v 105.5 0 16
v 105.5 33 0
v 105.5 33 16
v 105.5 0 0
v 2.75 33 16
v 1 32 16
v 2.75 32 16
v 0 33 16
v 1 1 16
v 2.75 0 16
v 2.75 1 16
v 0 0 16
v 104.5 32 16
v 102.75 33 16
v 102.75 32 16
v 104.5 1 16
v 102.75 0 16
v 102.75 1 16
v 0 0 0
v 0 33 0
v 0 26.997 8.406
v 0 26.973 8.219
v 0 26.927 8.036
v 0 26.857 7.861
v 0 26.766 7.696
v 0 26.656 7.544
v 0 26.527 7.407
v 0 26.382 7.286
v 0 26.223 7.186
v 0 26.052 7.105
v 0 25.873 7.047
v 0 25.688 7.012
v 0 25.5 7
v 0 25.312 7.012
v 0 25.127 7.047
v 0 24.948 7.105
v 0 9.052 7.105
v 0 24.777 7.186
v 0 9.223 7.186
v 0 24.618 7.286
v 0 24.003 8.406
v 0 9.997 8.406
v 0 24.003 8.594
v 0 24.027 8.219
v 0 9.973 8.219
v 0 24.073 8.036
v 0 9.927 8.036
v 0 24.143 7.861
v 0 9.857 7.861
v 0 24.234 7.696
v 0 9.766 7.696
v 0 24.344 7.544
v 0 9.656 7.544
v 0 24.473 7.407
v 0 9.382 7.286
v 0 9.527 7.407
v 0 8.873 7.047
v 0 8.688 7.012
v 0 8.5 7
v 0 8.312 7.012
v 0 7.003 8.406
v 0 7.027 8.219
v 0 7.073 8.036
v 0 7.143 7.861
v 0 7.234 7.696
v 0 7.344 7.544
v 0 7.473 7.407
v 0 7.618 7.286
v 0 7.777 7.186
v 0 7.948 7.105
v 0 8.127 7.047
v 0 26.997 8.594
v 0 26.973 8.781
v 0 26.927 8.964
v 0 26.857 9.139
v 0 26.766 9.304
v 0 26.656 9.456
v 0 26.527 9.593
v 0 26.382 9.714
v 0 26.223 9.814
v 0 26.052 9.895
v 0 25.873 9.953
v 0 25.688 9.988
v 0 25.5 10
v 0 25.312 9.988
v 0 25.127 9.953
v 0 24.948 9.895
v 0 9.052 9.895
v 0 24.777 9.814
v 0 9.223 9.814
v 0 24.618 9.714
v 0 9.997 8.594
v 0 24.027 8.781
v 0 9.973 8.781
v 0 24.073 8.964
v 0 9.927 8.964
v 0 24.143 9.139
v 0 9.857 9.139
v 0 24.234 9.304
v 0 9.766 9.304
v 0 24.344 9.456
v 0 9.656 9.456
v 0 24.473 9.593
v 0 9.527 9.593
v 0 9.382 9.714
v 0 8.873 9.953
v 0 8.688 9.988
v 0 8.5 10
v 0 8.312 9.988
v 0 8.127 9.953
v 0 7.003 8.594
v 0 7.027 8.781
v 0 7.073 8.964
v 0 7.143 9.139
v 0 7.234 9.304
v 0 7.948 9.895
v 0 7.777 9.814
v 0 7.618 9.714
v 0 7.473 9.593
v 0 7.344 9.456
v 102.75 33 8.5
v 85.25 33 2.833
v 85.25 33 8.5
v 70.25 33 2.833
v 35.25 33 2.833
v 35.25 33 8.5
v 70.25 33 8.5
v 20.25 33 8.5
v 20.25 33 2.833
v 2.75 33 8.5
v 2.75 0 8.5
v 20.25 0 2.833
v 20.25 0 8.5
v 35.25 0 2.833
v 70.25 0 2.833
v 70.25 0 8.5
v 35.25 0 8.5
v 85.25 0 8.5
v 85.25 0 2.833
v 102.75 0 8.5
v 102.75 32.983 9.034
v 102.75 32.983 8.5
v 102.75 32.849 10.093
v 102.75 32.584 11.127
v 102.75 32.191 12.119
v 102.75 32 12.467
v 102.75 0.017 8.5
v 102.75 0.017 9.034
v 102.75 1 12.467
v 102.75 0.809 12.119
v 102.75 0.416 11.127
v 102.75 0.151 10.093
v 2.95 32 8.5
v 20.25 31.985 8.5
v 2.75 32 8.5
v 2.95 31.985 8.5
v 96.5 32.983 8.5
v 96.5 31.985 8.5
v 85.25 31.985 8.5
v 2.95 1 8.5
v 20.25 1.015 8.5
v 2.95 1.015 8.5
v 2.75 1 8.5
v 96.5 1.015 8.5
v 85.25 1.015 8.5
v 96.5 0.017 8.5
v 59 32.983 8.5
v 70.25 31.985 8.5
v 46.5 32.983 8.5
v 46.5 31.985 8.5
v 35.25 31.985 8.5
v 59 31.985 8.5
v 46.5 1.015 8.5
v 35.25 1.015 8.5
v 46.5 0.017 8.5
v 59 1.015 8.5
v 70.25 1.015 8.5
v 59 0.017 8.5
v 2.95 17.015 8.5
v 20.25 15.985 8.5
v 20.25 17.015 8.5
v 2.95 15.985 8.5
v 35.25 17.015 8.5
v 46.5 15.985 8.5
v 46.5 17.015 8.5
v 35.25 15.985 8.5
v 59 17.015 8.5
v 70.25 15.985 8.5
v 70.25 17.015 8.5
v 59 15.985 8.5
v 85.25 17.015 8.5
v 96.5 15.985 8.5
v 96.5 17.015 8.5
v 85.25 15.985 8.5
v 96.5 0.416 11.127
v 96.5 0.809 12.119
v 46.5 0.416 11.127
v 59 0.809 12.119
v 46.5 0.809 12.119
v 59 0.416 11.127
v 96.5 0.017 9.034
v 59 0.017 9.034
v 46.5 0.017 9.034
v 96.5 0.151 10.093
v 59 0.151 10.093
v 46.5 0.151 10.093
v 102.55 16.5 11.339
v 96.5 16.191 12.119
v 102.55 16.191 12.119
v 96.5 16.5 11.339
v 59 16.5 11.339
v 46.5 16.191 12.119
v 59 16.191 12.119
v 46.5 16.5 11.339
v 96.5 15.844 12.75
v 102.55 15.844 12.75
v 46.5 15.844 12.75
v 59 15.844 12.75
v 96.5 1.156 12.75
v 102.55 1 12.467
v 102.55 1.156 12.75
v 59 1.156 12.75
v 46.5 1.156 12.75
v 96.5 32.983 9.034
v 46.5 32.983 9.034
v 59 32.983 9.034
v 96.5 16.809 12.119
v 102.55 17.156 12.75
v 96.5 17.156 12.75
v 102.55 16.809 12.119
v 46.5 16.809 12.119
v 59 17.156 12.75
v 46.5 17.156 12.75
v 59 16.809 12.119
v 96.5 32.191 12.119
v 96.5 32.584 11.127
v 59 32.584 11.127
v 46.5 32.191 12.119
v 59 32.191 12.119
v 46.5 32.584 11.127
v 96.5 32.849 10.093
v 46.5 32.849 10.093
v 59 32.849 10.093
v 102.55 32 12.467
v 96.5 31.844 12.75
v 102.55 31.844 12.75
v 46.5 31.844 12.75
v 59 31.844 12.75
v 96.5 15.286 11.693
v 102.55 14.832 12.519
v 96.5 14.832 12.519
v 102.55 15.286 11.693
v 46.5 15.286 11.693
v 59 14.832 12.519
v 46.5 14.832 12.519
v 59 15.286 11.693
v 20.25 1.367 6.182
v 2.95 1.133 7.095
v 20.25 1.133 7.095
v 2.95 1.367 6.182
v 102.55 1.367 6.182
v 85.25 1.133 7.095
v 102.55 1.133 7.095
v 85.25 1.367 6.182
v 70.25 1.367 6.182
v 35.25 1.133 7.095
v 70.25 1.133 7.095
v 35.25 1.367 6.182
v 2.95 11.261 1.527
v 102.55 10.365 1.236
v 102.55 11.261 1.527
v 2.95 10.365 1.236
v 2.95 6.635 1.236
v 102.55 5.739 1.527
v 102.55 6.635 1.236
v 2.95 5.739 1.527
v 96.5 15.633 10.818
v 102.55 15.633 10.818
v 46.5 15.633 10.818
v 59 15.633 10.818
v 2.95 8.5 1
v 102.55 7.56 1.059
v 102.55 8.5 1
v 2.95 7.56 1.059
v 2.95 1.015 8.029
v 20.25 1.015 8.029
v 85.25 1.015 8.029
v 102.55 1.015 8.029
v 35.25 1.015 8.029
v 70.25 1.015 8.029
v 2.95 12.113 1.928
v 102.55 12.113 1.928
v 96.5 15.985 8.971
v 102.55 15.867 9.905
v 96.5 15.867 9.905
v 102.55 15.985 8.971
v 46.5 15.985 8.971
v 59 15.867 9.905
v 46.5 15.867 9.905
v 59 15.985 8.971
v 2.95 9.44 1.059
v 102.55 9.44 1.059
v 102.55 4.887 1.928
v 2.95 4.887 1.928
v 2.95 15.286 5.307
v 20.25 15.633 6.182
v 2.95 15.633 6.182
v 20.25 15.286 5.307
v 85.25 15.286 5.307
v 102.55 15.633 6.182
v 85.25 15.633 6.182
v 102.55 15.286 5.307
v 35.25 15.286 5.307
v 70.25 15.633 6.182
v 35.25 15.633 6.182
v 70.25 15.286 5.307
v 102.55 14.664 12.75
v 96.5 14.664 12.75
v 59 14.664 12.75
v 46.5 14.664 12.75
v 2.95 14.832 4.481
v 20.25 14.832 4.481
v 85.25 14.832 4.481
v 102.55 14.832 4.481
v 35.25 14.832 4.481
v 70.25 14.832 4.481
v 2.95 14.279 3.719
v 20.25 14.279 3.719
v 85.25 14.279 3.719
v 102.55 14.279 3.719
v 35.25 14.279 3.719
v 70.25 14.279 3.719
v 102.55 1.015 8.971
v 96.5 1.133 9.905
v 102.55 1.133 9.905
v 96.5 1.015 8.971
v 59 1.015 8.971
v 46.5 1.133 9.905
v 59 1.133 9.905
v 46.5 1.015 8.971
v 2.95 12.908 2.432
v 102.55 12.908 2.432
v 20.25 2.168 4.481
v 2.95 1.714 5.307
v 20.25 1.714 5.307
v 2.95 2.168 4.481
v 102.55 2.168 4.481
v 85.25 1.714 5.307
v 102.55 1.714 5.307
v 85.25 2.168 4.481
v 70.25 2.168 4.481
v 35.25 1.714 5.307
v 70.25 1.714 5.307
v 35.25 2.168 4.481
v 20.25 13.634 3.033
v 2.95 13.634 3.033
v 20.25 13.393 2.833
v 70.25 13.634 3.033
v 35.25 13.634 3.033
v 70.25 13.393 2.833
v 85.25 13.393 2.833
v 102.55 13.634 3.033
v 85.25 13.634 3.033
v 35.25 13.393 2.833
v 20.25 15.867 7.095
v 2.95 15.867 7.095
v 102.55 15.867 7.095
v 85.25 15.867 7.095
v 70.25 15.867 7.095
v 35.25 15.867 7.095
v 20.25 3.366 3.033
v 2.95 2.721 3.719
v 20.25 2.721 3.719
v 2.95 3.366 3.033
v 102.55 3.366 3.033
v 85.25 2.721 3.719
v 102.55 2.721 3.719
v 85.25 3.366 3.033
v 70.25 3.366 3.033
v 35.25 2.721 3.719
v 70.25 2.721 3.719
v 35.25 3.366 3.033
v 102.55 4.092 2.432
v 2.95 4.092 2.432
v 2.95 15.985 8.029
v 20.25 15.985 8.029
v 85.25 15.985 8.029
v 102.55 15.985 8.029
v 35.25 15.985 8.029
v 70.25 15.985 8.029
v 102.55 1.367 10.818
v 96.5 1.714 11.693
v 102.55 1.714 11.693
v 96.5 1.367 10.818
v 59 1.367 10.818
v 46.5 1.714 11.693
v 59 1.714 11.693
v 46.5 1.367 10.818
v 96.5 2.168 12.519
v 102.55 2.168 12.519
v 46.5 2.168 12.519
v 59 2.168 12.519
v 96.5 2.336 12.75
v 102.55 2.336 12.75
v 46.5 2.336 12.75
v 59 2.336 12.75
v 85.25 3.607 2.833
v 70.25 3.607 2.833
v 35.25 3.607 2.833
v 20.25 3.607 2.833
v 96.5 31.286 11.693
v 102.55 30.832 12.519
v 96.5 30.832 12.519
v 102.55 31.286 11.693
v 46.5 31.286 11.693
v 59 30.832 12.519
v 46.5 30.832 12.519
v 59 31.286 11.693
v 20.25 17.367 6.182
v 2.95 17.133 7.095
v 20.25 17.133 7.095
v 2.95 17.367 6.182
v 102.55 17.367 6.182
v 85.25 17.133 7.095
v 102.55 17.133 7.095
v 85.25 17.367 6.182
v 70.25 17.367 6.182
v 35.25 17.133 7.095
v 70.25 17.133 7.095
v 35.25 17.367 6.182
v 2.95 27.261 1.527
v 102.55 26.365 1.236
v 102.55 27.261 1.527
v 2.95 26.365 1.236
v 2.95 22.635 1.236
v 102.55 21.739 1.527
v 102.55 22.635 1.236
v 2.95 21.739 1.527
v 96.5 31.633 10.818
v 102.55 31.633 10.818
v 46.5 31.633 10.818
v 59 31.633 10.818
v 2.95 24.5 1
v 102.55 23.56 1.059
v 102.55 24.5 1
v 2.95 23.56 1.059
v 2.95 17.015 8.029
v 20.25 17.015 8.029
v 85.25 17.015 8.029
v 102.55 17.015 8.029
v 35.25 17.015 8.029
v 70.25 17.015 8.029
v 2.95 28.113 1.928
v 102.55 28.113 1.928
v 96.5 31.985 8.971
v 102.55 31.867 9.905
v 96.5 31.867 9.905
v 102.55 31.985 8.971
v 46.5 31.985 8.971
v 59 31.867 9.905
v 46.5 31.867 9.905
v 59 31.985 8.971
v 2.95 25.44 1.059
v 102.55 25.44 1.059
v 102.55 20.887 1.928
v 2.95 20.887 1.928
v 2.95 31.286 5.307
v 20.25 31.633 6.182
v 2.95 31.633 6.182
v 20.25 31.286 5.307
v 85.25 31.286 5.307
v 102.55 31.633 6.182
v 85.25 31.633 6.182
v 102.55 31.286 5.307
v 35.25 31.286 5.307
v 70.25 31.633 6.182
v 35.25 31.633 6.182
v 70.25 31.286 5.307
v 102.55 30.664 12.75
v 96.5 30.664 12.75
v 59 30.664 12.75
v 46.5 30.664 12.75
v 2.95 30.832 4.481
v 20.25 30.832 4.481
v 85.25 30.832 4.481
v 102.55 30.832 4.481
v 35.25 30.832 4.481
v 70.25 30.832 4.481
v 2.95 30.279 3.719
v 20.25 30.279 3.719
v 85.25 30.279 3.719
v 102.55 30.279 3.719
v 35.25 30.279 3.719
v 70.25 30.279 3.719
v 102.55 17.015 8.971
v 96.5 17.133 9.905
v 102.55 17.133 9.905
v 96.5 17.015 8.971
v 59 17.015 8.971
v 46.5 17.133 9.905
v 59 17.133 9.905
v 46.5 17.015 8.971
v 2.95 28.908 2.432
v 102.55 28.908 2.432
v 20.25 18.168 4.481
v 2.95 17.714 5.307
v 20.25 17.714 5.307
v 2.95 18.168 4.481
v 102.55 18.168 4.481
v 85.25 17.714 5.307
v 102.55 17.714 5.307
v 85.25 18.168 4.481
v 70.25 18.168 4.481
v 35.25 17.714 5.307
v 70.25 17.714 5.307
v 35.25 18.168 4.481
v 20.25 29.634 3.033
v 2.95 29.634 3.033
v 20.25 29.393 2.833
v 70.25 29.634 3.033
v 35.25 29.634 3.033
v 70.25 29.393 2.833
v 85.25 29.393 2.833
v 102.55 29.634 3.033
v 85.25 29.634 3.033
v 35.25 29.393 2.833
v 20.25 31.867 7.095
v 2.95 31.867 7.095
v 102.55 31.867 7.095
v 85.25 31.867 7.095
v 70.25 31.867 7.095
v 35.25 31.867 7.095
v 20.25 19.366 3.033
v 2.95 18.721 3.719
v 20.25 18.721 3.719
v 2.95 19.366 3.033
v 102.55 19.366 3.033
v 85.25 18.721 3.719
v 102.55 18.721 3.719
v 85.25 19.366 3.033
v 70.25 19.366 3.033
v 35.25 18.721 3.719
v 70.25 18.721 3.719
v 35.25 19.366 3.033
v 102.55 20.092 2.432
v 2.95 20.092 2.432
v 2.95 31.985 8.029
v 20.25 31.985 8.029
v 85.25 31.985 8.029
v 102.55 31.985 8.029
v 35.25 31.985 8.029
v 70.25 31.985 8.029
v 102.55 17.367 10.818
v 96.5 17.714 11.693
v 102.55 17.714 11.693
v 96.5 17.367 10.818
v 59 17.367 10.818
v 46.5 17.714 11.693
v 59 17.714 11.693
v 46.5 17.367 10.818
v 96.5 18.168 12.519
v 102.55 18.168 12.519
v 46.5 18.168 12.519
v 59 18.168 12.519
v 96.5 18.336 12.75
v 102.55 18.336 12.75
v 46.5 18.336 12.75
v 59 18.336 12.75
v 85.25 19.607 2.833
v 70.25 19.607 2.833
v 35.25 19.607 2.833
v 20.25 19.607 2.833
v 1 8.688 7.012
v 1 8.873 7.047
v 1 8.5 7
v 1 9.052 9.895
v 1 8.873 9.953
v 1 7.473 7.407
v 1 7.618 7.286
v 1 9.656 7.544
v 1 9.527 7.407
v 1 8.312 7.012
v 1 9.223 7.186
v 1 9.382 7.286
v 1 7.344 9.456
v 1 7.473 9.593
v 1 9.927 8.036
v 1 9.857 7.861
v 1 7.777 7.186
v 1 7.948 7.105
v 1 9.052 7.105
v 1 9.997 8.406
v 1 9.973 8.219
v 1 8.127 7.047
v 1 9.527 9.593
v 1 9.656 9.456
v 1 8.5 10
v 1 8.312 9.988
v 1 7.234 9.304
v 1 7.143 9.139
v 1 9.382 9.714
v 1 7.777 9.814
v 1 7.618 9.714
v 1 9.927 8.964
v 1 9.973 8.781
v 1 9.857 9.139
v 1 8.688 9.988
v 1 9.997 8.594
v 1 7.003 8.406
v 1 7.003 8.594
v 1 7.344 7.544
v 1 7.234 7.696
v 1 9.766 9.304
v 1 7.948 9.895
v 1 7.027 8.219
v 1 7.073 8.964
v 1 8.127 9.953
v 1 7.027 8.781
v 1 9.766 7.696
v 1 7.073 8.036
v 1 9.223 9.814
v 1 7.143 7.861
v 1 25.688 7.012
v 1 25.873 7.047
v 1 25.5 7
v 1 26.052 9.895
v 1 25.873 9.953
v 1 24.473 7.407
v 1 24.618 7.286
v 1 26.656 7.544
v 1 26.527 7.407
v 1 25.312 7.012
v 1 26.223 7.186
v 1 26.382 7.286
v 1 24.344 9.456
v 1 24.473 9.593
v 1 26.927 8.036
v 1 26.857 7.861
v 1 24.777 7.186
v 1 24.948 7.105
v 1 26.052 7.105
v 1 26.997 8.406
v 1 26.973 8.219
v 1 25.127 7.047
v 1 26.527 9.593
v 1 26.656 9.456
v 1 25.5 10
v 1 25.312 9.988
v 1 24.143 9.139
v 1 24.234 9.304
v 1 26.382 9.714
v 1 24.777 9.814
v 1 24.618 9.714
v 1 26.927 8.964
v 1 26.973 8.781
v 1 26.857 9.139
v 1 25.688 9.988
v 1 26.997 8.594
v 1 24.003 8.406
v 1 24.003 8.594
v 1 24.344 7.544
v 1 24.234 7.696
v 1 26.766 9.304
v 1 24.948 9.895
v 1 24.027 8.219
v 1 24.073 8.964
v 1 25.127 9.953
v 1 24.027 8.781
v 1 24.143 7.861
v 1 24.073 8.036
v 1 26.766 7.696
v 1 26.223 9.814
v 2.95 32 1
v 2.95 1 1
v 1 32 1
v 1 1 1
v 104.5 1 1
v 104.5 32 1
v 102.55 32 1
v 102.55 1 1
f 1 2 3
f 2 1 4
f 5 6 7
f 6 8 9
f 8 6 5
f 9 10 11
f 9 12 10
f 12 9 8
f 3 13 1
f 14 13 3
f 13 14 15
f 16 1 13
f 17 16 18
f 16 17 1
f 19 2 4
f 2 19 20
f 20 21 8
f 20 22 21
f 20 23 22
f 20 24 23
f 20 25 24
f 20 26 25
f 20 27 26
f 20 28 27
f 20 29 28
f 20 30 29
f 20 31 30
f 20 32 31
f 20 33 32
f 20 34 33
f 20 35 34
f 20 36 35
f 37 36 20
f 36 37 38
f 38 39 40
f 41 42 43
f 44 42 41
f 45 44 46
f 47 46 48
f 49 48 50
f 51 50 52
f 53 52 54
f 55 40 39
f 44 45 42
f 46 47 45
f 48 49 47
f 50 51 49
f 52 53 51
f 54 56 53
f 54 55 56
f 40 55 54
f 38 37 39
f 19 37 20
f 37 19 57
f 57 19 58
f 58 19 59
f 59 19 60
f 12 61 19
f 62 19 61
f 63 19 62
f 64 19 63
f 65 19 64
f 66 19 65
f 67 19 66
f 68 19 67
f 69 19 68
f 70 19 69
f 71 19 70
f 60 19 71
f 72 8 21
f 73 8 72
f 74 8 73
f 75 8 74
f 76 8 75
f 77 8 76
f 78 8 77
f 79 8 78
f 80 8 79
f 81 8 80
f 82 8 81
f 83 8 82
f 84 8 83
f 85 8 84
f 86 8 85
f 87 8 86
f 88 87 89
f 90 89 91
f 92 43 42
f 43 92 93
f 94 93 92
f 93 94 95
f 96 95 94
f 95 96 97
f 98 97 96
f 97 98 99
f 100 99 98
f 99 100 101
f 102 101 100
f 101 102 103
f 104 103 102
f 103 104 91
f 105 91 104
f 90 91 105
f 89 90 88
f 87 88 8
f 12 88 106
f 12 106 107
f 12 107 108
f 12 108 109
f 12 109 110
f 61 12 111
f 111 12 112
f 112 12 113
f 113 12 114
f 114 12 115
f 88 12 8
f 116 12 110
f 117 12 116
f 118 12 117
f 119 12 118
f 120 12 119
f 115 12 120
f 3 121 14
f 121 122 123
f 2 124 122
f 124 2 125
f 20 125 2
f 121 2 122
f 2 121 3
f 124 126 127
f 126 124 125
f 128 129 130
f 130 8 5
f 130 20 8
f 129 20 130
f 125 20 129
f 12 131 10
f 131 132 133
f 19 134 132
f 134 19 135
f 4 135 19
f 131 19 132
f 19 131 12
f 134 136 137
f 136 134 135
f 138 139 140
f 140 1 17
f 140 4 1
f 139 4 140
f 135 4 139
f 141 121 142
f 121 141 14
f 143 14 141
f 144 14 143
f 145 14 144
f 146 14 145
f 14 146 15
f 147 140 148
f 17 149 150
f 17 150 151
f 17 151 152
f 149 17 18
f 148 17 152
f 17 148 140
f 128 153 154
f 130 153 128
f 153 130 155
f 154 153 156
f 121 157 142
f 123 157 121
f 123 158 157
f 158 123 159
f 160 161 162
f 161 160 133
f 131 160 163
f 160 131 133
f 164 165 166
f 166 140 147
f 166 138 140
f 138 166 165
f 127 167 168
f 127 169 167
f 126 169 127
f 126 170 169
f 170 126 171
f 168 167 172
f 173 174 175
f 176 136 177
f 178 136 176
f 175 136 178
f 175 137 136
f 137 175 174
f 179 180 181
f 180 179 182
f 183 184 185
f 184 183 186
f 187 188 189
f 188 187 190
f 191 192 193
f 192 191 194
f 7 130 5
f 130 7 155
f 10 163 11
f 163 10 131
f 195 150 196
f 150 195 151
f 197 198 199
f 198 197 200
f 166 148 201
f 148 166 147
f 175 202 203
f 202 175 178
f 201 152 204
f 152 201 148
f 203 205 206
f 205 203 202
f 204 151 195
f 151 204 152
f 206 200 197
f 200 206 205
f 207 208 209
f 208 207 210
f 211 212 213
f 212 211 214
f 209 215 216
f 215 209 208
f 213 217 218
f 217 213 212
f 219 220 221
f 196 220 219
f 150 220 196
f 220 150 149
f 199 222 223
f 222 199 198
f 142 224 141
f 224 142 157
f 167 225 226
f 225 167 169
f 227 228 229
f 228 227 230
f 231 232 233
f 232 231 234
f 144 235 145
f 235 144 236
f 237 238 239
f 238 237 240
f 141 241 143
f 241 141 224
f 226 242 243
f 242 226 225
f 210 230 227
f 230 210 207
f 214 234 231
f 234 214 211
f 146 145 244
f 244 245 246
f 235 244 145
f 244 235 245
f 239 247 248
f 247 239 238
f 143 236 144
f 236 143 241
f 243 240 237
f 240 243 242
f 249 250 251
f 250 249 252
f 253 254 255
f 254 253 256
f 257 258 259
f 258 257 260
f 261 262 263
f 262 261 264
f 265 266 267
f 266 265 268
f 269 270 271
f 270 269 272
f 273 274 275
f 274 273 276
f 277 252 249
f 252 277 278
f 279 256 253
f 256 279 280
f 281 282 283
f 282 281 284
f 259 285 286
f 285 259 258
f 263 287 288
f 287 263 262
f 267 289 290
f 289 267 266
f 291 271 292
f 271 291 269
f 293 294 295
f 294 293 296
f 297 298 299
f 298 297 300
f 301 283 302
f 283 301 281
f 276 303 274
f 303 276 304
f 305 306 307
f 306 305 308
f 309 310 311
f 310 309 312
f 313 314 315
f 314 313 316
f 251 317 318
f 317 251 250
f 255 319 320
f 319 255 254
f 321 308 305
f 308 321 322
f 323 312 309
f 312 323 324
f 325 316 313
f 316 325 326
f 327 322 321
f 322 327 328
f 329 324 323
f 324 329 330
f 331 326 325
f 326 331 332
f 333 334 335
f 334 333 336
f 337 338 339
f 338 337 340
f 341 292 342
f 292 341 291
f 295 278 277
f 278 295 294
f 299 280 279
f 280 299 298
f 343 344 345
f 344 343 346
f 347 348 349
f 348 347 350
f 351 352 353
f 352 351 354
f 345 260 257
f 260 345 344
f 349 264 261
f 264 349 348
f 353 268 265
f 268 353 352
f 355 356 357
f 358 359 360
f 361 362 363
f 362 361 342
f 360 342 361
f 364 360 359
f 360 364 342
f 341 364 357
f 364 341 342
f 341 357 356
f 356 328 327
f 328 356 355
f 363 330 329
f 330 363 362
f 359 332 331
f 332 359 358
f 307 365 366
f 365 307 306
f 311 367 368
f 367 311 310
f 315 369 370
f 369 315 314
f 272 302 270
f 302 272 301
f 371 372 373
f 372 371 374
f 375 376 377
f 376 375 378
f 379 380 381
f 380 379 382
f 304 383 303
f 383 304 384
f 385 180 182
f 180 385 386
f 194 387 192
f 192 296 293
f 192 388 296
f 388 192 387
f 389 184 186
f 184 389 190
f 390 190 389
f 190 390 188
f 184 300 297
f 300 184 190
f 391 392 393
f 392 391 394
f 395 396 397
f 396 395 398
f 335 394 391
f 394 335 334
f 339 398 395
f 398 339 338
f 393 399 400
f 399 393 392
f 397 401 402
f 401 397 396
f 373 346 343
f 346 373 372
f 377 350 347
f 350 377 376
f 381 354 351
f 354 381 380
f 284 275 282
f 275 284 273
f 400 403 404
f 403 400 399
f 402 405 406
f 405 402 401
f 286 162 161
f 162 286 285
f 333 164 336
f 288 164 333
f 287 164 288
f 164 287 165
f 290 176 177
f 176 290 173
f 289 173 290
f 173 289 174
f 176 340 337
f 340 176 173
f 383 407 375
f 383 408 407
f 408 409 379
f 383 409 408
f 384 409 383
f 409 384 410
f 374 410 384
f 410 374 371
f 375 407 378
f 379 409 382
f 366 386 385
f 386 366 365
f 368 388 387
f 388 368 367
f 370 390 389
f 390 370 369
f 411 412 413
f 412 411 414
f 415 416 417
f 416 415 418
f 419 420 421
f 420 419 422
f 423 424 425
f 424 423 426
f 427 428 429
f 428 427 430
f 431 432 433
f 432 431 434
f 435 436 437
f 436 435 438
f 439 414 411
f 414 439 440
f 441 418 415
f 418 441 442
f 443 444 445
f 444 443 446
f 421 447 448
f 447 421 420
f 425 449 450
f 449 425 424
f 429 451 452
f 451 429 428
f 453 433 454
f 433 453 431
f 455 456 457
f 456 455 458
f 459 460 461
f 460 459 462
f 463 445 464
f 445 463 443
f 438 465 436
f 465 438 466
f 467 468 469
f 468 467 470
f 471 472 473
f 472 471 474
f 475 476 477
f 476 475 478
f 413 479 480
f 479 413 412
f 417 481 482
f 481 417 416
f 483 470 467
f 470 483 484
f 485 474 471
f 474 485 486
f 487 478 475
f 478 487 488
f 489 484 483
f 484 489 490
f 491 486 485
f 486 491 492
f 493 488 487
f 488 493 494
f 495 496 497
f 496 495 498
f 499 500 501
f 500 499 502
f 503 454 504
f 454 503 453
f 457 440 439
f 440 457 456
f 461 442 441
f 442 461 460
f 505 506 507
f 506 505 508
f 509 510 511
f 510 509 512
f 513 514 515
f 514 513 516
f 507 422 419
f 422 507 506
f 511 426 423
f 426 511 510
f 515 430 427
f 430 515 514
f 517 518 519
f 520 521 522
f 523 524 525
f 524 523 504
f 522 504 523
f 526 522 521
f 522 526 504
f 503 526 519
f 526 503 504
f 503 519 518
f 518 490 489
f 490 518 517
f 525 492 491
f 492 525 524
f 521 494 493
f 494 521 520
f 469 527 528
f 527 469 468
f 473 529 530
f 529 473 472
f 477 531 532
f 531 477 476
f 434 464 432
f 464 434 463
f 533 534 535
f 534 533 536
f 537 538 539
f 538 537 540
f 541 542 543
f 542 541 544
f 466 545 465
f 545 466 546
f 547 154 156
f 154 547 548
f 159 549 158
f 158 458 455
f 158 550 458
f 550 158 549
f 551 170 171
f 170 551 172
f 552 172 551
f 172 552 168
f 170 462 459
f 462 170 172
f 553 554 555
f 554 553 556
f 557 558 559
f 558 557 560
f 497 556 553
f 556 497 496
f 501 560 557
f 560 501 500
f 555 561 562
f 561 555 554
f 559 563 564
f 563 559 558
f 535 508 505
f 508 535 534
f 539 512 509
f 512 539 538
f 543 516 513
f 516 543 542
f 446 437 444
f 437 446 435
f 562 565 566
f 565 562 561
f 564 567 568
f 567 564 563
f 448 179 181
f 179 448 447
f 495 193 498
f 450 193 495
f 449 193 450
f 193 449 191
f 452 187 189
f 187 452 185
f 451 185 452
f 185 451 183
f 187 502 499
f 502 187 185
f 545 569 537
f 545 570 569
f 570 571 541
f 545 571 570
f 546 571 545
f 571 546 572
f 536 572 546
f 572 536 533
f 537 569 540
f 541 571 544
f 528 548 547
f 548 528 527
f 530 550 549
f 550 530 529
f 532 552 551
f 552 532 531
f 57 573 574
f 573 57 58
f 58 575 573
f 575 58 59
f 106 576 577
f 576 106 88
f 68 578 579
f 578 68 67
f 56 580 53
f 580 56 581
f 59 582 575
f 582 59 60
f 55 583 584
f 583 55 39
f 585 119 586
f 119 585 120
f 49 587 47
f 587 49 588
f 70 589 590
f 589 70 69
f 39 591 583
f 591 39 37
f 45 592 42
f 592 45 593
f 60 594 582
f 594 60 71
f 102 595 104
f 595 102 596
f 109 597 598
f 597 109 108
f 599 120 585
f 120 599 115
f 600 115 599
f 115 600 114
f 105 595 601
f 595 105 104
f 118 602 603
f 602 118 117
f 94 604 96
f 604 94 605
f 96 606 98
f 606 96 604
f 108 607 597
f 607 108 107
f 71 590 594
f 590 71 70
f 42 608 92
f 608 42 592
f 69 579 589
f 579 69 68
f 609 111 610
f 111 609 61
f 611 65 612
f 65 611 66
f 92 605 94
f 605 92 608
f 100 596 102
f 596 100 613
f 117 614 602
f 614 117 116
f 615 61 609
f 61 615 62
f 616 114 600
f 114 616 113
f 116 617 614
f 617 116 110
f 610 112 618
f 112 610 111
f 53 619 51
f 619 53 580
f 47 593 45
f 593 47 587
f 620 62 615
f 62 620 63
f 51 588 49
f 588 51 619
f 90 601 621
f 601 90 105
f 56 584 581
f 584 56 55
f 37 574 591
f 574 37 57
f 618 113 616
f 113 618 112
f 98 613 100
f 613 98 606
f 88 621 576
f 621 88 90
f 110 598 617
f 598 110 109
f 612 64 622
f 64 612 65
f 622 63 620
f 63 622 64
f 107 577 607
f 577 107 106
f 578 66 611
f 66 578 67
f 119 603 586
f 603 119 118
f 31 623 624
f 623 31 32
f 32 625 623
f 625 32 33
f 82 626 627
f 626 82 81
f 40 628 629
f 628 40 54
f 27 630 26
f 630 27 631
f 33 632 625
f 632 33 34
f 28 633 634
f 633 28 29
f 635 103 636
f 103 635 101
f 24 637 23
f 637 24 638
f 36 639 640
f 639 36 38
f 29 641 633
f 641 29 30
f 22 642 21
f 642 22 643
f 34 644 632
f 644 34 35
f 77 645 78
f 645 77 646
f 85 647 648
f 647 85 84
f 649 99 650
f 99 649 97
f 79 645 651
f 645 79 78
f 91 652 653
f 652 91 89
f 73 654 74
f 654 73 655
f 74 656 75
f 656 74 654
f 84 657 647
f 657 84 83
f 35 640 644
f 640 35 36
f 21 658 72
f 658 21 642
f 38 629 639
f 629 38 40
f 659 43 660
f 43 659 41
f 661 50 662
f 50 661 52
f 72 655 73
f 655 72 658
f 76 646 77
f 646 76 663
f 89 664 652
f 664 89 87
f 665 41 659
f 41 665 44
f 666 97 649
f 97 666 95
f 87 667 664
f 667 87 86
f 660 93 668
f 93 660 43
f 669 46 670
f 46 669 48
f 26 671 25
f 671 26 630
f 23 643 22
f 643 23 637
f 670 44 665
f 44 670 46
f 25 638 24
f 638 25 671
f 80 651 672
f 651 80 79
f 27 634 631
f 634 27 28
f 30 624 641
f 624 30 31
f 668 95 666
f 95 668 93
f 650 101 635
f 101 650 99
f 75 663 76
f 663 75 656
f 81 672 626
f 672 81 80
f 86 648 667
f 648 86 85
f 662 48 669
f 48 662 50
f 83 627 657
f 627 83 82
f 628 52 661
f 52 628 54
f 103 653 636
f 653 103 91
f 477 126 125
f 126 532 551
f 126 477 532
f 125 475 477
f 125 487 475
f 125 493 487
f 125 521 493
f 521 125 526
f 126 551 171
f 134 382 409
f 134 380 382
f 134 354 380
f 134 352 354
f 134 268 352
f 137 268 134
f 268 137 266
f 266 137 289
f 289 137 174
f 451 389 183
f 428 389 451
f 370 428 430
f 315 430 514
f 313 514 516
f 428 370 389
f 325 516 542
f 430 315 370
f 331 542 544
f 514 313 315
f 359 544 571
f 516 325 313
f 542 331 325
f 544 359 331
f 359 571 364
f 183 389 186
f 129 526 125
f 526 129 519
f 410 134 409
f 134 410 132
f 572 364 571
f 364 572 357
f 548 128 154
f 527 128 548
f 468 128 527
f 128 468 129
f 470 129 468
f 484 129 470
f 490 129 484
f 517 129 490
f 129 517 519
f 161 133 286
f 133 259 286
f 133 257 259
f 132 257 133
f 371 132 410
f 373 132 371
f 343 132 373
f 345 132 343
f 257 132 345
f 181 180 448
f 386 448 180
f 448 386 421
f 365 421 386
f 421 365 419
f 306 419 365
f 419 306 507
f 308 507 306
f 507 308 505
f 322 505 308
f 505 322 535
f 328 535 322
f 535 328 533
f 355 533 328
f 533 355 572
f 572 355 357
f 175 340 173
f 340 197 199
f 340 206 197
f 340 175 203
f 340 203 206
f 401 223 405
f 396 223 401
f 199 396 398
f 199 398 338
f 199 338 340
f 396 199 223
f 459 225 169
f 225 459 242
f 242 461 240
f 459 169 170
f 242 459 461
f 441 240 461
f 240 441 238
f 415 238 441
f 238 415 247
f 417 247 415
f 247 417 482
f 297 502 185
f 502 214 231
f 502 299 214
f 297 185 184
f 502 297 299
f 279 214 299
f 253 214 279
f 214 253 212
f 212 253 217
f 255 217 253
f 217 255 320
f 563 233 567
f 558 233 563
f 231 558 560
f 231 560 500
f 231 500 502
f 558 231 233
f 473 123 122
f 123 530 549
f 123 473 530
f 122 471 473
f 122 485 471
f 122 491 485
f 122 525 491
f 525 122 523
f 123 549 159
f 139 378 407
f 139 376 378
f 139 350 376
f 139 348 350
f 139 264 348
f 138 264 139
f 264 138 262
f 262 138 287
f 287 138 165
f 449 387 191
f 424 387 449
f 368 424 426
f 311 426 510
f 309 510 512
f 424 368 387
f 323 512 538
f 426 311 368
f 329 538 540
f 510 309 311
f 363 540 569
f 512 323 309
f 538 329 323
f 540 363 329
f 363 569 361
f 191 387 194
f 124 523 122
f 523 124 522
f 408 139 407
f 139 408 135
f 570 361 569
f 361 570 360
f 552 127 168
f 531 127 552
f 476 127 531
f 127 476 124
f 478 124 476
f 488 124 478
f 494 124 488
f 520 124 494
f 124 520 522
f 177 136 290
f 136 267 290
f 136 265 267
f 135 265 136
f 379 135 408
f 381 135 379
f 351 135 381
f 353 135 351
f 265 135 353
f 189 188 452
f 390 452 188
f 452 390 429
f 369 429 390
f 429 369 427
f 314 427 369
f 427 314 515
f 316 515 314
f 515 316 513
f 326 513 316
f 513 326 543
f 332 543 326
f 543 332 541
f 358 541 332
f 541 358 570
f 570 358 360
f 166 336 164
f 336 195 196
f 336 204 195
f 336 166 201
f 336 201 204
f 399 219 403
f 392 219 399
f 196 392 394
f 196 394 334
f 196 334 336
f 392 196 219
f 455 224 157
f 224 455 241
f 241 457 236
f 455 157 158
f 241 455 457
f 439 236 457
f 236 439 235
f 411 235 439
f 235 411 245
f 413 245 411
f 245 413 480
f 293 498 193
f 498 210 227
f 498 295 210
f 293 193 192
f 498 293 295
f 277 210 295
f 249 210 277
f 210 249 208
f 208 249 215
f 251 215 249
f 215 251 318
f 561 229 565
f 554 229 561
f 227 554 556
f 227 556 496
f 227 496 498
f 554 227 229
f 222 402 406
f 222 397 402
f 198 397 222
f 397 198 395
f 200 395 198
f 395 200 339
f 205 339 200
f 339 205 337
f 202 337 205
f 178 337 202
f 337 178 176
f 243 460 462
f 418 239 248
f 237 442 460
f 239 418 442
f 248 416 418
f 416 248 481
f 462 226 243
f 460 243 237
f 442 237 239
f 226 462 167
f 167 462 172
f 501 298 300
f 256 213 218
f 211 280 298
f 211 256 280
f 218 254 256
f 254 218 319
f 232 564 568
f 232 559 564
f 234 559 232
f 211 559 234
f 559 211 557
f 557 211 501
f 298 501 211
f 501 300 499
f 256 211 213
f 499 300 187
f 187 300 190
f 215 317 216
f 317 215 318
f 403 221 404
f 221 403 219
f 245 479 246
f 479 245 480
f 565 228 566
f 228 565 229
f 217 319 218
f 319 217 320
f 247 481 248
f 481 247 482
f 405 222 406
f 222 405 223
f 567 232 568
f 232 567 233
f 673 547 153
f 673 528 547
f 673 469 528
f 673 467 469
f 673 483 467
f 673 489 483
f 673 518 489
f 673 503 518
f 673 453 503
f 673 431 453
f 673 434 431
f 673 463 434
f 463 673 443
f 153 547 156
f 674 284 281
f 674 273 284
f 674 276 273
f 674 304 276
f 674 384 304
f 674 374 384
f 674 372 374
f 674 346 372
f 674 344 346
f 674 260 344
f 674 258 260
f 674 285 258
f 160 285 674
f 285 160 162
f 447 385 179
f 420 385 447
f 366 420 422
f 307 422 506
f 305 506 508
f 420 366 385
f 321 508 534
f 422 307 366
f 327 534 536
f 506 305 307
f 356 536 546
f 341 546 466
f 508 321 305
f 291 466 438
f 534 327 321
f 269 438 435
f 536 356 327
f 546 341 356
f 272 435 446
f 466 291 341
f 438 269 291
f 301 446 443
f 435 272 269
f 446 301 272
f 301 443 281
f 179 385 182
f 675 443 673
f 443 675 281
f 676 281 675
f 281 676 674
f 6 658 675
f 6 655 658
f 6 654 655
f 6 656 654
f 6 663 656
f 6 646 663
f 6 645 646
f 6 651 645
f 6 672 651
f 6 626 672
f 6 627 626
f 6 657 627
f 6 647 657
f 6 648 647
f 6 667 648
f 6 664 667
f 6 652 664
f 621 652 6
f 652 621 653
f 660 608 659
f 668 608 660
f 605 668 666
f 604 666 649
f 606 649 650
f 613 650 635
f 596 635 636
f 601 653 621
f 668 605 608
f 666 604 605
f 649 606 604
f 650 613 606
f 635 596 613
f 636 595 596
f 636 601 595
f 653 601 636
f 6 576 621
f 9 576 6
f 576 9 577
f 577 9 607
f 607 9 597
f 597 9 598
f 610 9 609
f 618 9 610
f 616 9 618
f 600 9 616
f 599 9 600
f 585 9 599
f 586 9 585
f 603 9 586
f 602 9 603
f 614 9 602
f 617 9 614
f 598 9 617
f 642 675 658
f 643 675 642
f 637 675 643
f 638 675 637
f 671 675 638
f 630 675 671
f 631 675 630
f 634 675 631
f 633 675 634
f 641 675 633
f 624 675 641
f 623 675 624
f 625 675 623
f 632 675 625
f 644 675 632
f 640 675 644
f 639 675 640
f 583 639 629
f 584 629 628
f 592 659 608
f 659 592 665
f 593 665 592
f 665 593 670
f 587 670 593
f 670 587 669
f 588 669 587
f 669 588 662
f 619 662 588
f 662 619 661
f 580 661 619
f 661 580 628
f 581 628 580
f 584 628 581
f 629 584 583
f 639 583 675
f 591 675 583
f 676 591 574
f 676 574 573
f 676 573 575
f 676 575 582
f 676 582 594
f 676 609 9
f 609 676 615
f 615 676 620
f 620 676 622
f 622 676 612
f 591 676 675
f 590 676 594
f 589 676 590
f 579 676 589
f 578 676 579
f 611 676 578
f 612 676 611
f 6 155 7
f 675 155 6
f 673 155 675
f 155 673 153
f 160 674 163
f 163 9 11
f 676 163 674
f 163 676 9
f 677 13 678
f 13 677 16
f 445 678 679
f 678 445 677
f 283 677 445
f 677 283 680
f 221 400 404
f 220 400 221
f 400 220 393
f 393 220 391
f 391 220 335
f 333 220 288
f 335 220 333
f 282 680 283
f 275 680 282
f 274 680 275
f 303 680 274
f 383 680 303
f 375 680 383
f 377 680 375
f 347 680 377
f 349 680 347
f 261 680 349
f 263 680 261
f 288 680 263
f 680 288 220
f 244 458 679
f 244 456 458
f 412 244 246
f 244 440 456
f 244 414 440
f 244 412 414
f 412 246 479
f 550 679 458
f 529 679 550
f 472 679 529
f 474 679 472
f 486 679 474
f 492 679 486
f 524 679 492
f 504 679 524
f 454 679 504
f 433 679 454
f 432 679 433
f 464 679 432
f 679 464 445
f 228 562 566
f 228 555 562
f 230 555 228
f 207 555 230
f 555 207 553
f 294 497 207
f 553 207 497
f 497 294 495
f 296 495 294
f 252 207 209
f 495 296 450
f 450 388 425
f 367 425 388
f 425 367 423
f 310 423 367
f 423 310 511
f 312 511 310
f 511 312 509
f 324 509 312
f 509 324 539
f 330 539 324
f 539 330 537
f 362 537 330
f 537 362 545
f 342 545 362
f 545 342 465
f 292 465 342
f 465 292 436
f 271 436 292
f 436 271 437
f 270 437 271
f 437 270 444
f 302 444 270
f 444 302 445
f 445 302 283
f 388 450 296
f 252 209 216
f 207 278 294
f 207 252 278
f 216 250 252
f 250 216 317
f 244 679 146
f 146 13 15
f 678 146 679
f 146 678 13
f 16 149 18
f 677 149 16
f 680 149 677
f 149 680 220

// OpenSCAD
/* [General] */
// Amount of battery rows
rows = 2; // [1:10]
// Amount of battery columns
columns = 2; // [1:10]

// Diameter of the battery
batteryDiameter = 15;
// Length of the battery
batteryLength = 50;

// With of the cutout to help removing the battery
batteryHolderPullWidth = 15;

// Bottom Height
batteryHolderBottom = 1;
// Wall thickness
batteryHolderWalls = 1;

/* [Connector] */
// Thickness of the battery tabs
batteryConnectorThickness = 1.75;
// Diameter of the holes for power cables
batteryHolderHoleDiameter = 3;

/* [Hidden] */
$fn = 50;

spacing = 0.2;
batteryRadius = batteryDiameter / 2;
batteryHolderHeight = batteryHolderBottom + batteryRadius;
batteryHolderHeightOuter = batteryHolderBottom + batteryDiameter;
batteryHolderLength = (batteryLength * columns) + (batteryHolderWalls + batteryConnectorThickness) * 2;
batteryHolderLengthInner = (batteryLength) * columns;

batteryXOffset = batteryHolderWalls + batteryConnectorThickness;
batteryPullOffset = batteryLength / 2 - batteryHolderPullWidth / 2;
batteryHolderWidth = (batteryDiameter + batteryHolderWalls) * rows + batteryHolderWalls;

batteryHolderHoleRadius = batteryHolderHoleDiameter / 2;

batteryHolder();

module batteryHolder() {
  difference() {
    group() {
      difference() {
        cube([batteryHolderLength, batteryHolderWidth, batteryHolderHeightOuter]);
        translate([batteryHolderWalls + batteryConnectorThickness, -1, batteryHolderHeight]) {
          cube([batteryHolderLengthInner, batteryDiameter * rows + batteryHolderWalls * (rows + 1) + 2, batteryHolderHeight + 1]);
      }
      }
      
      for(i=[1:1:rows]) {
        rotate([0, 90, 0])
          translate([-batteryRadius - batteryHolderBottom, batteryRadius + batteryHolderWalls + (batteryDiameter + batteryHolderWalls) * (i - 1), 0])
            cylinder(h=batteryLength * columns + (batteryHolderWalls + batteryConnectorThickness) * 2, r =batteryRadius + batteryHolderWalls);
      }
    }
    
    translate([-1,-1,batteryHolderHeightOuter])
      cube([batteryHolderLength + 2, batteryHolderWidth + 2, batteryHolderHeightOuter]);

    for(i=[1:1:rows]) {
      rotate([0, 90, 0]) {
        translate([-batteryRadius - batteryHolderBottom, (batteryRadius + batteryHolderWalls) + (batteryDiameter + batteryHolderWalls) * (i - 1), batteryHolderWalls + batteryConnectorThickness])
          cylinder(h=batteryLength * columns, r =batteryRadius);
      }
    }
    
    translate([batteryHolderWalls + batteryConnectorThickness, -1, batteryHolderHeight * 1.5]) {
      cube([batteryHolderLengthInner, (batteryDiameter + batteryHolderWalls) * rows + batteryHolderWalls + 2, batteryHolderHeight + 1]);
    }
    
    rotate([0, 90, 0]) {
      translate([-batteryRadius - batteryHolderBottom, batteryRadius + batteryHolderWalls, -1]) {
        cylinder(h=batteryHolderWalls + 2, r=batteryHolderHoleRadius);
      }
      translate([-batteryRadius - batteryHolderBottom, batteryRadius + batteryHolderWalls * 2 + (batteryDiameter + batteryHolderWalls) * (rows - 1), -1]) {
        cylinder(h=batteryHolderWalls + 2, r=batteryHolderHoleRadius);
      }
    }
    
    translate([batteryHolderWalls, batteryHolderWalls, batteryHolderBottom])
      cube([batteryConnectorThickness + spacing, (batteryDiameter + batteryHolderWalls) * rows - batteryHolderWalls, batteryHolderBottom + batteryDiameter + 1]);
    
    translate([batteryHolderWalls + batteryConnectorThickness + batteryLength * columns - spacing, batteryHolderWalls, batteryHolderBottom])
      cube([batteryConnectorThickness + spacing,  (batteryDiameter + batteryHolderWalls) * rows - batteryHolderWalls, batteryHolderBottom + batteryDiameter + 1]);
    
    for(i=[1:1:columns]) {
      translate([batteryXOffset + batteryPullOffset + (batteryLength * (i - 1)), -1, batteryHolderHeight / 3])
        cube([batteryHolderPullWidth, batteryHolderWidth + 2, batteryHolderHeight * 2]);
      
      translate([batteryXOffset + batteryLength / 8 + (batteryLength * (i - 1)), -1, batteryHolderHeight])
        cube([batteryLength / 8 * 6, batteryHolderWidth + 2, batteryHolderHeight * 2]);
    }

    translate([batteryXOffset, -1, batteryHolderHeight])
        cube([batteryLength / 8 * 6, batteryHolderWidth + 2, batteryHolderHeight * 2]);
  }
}
